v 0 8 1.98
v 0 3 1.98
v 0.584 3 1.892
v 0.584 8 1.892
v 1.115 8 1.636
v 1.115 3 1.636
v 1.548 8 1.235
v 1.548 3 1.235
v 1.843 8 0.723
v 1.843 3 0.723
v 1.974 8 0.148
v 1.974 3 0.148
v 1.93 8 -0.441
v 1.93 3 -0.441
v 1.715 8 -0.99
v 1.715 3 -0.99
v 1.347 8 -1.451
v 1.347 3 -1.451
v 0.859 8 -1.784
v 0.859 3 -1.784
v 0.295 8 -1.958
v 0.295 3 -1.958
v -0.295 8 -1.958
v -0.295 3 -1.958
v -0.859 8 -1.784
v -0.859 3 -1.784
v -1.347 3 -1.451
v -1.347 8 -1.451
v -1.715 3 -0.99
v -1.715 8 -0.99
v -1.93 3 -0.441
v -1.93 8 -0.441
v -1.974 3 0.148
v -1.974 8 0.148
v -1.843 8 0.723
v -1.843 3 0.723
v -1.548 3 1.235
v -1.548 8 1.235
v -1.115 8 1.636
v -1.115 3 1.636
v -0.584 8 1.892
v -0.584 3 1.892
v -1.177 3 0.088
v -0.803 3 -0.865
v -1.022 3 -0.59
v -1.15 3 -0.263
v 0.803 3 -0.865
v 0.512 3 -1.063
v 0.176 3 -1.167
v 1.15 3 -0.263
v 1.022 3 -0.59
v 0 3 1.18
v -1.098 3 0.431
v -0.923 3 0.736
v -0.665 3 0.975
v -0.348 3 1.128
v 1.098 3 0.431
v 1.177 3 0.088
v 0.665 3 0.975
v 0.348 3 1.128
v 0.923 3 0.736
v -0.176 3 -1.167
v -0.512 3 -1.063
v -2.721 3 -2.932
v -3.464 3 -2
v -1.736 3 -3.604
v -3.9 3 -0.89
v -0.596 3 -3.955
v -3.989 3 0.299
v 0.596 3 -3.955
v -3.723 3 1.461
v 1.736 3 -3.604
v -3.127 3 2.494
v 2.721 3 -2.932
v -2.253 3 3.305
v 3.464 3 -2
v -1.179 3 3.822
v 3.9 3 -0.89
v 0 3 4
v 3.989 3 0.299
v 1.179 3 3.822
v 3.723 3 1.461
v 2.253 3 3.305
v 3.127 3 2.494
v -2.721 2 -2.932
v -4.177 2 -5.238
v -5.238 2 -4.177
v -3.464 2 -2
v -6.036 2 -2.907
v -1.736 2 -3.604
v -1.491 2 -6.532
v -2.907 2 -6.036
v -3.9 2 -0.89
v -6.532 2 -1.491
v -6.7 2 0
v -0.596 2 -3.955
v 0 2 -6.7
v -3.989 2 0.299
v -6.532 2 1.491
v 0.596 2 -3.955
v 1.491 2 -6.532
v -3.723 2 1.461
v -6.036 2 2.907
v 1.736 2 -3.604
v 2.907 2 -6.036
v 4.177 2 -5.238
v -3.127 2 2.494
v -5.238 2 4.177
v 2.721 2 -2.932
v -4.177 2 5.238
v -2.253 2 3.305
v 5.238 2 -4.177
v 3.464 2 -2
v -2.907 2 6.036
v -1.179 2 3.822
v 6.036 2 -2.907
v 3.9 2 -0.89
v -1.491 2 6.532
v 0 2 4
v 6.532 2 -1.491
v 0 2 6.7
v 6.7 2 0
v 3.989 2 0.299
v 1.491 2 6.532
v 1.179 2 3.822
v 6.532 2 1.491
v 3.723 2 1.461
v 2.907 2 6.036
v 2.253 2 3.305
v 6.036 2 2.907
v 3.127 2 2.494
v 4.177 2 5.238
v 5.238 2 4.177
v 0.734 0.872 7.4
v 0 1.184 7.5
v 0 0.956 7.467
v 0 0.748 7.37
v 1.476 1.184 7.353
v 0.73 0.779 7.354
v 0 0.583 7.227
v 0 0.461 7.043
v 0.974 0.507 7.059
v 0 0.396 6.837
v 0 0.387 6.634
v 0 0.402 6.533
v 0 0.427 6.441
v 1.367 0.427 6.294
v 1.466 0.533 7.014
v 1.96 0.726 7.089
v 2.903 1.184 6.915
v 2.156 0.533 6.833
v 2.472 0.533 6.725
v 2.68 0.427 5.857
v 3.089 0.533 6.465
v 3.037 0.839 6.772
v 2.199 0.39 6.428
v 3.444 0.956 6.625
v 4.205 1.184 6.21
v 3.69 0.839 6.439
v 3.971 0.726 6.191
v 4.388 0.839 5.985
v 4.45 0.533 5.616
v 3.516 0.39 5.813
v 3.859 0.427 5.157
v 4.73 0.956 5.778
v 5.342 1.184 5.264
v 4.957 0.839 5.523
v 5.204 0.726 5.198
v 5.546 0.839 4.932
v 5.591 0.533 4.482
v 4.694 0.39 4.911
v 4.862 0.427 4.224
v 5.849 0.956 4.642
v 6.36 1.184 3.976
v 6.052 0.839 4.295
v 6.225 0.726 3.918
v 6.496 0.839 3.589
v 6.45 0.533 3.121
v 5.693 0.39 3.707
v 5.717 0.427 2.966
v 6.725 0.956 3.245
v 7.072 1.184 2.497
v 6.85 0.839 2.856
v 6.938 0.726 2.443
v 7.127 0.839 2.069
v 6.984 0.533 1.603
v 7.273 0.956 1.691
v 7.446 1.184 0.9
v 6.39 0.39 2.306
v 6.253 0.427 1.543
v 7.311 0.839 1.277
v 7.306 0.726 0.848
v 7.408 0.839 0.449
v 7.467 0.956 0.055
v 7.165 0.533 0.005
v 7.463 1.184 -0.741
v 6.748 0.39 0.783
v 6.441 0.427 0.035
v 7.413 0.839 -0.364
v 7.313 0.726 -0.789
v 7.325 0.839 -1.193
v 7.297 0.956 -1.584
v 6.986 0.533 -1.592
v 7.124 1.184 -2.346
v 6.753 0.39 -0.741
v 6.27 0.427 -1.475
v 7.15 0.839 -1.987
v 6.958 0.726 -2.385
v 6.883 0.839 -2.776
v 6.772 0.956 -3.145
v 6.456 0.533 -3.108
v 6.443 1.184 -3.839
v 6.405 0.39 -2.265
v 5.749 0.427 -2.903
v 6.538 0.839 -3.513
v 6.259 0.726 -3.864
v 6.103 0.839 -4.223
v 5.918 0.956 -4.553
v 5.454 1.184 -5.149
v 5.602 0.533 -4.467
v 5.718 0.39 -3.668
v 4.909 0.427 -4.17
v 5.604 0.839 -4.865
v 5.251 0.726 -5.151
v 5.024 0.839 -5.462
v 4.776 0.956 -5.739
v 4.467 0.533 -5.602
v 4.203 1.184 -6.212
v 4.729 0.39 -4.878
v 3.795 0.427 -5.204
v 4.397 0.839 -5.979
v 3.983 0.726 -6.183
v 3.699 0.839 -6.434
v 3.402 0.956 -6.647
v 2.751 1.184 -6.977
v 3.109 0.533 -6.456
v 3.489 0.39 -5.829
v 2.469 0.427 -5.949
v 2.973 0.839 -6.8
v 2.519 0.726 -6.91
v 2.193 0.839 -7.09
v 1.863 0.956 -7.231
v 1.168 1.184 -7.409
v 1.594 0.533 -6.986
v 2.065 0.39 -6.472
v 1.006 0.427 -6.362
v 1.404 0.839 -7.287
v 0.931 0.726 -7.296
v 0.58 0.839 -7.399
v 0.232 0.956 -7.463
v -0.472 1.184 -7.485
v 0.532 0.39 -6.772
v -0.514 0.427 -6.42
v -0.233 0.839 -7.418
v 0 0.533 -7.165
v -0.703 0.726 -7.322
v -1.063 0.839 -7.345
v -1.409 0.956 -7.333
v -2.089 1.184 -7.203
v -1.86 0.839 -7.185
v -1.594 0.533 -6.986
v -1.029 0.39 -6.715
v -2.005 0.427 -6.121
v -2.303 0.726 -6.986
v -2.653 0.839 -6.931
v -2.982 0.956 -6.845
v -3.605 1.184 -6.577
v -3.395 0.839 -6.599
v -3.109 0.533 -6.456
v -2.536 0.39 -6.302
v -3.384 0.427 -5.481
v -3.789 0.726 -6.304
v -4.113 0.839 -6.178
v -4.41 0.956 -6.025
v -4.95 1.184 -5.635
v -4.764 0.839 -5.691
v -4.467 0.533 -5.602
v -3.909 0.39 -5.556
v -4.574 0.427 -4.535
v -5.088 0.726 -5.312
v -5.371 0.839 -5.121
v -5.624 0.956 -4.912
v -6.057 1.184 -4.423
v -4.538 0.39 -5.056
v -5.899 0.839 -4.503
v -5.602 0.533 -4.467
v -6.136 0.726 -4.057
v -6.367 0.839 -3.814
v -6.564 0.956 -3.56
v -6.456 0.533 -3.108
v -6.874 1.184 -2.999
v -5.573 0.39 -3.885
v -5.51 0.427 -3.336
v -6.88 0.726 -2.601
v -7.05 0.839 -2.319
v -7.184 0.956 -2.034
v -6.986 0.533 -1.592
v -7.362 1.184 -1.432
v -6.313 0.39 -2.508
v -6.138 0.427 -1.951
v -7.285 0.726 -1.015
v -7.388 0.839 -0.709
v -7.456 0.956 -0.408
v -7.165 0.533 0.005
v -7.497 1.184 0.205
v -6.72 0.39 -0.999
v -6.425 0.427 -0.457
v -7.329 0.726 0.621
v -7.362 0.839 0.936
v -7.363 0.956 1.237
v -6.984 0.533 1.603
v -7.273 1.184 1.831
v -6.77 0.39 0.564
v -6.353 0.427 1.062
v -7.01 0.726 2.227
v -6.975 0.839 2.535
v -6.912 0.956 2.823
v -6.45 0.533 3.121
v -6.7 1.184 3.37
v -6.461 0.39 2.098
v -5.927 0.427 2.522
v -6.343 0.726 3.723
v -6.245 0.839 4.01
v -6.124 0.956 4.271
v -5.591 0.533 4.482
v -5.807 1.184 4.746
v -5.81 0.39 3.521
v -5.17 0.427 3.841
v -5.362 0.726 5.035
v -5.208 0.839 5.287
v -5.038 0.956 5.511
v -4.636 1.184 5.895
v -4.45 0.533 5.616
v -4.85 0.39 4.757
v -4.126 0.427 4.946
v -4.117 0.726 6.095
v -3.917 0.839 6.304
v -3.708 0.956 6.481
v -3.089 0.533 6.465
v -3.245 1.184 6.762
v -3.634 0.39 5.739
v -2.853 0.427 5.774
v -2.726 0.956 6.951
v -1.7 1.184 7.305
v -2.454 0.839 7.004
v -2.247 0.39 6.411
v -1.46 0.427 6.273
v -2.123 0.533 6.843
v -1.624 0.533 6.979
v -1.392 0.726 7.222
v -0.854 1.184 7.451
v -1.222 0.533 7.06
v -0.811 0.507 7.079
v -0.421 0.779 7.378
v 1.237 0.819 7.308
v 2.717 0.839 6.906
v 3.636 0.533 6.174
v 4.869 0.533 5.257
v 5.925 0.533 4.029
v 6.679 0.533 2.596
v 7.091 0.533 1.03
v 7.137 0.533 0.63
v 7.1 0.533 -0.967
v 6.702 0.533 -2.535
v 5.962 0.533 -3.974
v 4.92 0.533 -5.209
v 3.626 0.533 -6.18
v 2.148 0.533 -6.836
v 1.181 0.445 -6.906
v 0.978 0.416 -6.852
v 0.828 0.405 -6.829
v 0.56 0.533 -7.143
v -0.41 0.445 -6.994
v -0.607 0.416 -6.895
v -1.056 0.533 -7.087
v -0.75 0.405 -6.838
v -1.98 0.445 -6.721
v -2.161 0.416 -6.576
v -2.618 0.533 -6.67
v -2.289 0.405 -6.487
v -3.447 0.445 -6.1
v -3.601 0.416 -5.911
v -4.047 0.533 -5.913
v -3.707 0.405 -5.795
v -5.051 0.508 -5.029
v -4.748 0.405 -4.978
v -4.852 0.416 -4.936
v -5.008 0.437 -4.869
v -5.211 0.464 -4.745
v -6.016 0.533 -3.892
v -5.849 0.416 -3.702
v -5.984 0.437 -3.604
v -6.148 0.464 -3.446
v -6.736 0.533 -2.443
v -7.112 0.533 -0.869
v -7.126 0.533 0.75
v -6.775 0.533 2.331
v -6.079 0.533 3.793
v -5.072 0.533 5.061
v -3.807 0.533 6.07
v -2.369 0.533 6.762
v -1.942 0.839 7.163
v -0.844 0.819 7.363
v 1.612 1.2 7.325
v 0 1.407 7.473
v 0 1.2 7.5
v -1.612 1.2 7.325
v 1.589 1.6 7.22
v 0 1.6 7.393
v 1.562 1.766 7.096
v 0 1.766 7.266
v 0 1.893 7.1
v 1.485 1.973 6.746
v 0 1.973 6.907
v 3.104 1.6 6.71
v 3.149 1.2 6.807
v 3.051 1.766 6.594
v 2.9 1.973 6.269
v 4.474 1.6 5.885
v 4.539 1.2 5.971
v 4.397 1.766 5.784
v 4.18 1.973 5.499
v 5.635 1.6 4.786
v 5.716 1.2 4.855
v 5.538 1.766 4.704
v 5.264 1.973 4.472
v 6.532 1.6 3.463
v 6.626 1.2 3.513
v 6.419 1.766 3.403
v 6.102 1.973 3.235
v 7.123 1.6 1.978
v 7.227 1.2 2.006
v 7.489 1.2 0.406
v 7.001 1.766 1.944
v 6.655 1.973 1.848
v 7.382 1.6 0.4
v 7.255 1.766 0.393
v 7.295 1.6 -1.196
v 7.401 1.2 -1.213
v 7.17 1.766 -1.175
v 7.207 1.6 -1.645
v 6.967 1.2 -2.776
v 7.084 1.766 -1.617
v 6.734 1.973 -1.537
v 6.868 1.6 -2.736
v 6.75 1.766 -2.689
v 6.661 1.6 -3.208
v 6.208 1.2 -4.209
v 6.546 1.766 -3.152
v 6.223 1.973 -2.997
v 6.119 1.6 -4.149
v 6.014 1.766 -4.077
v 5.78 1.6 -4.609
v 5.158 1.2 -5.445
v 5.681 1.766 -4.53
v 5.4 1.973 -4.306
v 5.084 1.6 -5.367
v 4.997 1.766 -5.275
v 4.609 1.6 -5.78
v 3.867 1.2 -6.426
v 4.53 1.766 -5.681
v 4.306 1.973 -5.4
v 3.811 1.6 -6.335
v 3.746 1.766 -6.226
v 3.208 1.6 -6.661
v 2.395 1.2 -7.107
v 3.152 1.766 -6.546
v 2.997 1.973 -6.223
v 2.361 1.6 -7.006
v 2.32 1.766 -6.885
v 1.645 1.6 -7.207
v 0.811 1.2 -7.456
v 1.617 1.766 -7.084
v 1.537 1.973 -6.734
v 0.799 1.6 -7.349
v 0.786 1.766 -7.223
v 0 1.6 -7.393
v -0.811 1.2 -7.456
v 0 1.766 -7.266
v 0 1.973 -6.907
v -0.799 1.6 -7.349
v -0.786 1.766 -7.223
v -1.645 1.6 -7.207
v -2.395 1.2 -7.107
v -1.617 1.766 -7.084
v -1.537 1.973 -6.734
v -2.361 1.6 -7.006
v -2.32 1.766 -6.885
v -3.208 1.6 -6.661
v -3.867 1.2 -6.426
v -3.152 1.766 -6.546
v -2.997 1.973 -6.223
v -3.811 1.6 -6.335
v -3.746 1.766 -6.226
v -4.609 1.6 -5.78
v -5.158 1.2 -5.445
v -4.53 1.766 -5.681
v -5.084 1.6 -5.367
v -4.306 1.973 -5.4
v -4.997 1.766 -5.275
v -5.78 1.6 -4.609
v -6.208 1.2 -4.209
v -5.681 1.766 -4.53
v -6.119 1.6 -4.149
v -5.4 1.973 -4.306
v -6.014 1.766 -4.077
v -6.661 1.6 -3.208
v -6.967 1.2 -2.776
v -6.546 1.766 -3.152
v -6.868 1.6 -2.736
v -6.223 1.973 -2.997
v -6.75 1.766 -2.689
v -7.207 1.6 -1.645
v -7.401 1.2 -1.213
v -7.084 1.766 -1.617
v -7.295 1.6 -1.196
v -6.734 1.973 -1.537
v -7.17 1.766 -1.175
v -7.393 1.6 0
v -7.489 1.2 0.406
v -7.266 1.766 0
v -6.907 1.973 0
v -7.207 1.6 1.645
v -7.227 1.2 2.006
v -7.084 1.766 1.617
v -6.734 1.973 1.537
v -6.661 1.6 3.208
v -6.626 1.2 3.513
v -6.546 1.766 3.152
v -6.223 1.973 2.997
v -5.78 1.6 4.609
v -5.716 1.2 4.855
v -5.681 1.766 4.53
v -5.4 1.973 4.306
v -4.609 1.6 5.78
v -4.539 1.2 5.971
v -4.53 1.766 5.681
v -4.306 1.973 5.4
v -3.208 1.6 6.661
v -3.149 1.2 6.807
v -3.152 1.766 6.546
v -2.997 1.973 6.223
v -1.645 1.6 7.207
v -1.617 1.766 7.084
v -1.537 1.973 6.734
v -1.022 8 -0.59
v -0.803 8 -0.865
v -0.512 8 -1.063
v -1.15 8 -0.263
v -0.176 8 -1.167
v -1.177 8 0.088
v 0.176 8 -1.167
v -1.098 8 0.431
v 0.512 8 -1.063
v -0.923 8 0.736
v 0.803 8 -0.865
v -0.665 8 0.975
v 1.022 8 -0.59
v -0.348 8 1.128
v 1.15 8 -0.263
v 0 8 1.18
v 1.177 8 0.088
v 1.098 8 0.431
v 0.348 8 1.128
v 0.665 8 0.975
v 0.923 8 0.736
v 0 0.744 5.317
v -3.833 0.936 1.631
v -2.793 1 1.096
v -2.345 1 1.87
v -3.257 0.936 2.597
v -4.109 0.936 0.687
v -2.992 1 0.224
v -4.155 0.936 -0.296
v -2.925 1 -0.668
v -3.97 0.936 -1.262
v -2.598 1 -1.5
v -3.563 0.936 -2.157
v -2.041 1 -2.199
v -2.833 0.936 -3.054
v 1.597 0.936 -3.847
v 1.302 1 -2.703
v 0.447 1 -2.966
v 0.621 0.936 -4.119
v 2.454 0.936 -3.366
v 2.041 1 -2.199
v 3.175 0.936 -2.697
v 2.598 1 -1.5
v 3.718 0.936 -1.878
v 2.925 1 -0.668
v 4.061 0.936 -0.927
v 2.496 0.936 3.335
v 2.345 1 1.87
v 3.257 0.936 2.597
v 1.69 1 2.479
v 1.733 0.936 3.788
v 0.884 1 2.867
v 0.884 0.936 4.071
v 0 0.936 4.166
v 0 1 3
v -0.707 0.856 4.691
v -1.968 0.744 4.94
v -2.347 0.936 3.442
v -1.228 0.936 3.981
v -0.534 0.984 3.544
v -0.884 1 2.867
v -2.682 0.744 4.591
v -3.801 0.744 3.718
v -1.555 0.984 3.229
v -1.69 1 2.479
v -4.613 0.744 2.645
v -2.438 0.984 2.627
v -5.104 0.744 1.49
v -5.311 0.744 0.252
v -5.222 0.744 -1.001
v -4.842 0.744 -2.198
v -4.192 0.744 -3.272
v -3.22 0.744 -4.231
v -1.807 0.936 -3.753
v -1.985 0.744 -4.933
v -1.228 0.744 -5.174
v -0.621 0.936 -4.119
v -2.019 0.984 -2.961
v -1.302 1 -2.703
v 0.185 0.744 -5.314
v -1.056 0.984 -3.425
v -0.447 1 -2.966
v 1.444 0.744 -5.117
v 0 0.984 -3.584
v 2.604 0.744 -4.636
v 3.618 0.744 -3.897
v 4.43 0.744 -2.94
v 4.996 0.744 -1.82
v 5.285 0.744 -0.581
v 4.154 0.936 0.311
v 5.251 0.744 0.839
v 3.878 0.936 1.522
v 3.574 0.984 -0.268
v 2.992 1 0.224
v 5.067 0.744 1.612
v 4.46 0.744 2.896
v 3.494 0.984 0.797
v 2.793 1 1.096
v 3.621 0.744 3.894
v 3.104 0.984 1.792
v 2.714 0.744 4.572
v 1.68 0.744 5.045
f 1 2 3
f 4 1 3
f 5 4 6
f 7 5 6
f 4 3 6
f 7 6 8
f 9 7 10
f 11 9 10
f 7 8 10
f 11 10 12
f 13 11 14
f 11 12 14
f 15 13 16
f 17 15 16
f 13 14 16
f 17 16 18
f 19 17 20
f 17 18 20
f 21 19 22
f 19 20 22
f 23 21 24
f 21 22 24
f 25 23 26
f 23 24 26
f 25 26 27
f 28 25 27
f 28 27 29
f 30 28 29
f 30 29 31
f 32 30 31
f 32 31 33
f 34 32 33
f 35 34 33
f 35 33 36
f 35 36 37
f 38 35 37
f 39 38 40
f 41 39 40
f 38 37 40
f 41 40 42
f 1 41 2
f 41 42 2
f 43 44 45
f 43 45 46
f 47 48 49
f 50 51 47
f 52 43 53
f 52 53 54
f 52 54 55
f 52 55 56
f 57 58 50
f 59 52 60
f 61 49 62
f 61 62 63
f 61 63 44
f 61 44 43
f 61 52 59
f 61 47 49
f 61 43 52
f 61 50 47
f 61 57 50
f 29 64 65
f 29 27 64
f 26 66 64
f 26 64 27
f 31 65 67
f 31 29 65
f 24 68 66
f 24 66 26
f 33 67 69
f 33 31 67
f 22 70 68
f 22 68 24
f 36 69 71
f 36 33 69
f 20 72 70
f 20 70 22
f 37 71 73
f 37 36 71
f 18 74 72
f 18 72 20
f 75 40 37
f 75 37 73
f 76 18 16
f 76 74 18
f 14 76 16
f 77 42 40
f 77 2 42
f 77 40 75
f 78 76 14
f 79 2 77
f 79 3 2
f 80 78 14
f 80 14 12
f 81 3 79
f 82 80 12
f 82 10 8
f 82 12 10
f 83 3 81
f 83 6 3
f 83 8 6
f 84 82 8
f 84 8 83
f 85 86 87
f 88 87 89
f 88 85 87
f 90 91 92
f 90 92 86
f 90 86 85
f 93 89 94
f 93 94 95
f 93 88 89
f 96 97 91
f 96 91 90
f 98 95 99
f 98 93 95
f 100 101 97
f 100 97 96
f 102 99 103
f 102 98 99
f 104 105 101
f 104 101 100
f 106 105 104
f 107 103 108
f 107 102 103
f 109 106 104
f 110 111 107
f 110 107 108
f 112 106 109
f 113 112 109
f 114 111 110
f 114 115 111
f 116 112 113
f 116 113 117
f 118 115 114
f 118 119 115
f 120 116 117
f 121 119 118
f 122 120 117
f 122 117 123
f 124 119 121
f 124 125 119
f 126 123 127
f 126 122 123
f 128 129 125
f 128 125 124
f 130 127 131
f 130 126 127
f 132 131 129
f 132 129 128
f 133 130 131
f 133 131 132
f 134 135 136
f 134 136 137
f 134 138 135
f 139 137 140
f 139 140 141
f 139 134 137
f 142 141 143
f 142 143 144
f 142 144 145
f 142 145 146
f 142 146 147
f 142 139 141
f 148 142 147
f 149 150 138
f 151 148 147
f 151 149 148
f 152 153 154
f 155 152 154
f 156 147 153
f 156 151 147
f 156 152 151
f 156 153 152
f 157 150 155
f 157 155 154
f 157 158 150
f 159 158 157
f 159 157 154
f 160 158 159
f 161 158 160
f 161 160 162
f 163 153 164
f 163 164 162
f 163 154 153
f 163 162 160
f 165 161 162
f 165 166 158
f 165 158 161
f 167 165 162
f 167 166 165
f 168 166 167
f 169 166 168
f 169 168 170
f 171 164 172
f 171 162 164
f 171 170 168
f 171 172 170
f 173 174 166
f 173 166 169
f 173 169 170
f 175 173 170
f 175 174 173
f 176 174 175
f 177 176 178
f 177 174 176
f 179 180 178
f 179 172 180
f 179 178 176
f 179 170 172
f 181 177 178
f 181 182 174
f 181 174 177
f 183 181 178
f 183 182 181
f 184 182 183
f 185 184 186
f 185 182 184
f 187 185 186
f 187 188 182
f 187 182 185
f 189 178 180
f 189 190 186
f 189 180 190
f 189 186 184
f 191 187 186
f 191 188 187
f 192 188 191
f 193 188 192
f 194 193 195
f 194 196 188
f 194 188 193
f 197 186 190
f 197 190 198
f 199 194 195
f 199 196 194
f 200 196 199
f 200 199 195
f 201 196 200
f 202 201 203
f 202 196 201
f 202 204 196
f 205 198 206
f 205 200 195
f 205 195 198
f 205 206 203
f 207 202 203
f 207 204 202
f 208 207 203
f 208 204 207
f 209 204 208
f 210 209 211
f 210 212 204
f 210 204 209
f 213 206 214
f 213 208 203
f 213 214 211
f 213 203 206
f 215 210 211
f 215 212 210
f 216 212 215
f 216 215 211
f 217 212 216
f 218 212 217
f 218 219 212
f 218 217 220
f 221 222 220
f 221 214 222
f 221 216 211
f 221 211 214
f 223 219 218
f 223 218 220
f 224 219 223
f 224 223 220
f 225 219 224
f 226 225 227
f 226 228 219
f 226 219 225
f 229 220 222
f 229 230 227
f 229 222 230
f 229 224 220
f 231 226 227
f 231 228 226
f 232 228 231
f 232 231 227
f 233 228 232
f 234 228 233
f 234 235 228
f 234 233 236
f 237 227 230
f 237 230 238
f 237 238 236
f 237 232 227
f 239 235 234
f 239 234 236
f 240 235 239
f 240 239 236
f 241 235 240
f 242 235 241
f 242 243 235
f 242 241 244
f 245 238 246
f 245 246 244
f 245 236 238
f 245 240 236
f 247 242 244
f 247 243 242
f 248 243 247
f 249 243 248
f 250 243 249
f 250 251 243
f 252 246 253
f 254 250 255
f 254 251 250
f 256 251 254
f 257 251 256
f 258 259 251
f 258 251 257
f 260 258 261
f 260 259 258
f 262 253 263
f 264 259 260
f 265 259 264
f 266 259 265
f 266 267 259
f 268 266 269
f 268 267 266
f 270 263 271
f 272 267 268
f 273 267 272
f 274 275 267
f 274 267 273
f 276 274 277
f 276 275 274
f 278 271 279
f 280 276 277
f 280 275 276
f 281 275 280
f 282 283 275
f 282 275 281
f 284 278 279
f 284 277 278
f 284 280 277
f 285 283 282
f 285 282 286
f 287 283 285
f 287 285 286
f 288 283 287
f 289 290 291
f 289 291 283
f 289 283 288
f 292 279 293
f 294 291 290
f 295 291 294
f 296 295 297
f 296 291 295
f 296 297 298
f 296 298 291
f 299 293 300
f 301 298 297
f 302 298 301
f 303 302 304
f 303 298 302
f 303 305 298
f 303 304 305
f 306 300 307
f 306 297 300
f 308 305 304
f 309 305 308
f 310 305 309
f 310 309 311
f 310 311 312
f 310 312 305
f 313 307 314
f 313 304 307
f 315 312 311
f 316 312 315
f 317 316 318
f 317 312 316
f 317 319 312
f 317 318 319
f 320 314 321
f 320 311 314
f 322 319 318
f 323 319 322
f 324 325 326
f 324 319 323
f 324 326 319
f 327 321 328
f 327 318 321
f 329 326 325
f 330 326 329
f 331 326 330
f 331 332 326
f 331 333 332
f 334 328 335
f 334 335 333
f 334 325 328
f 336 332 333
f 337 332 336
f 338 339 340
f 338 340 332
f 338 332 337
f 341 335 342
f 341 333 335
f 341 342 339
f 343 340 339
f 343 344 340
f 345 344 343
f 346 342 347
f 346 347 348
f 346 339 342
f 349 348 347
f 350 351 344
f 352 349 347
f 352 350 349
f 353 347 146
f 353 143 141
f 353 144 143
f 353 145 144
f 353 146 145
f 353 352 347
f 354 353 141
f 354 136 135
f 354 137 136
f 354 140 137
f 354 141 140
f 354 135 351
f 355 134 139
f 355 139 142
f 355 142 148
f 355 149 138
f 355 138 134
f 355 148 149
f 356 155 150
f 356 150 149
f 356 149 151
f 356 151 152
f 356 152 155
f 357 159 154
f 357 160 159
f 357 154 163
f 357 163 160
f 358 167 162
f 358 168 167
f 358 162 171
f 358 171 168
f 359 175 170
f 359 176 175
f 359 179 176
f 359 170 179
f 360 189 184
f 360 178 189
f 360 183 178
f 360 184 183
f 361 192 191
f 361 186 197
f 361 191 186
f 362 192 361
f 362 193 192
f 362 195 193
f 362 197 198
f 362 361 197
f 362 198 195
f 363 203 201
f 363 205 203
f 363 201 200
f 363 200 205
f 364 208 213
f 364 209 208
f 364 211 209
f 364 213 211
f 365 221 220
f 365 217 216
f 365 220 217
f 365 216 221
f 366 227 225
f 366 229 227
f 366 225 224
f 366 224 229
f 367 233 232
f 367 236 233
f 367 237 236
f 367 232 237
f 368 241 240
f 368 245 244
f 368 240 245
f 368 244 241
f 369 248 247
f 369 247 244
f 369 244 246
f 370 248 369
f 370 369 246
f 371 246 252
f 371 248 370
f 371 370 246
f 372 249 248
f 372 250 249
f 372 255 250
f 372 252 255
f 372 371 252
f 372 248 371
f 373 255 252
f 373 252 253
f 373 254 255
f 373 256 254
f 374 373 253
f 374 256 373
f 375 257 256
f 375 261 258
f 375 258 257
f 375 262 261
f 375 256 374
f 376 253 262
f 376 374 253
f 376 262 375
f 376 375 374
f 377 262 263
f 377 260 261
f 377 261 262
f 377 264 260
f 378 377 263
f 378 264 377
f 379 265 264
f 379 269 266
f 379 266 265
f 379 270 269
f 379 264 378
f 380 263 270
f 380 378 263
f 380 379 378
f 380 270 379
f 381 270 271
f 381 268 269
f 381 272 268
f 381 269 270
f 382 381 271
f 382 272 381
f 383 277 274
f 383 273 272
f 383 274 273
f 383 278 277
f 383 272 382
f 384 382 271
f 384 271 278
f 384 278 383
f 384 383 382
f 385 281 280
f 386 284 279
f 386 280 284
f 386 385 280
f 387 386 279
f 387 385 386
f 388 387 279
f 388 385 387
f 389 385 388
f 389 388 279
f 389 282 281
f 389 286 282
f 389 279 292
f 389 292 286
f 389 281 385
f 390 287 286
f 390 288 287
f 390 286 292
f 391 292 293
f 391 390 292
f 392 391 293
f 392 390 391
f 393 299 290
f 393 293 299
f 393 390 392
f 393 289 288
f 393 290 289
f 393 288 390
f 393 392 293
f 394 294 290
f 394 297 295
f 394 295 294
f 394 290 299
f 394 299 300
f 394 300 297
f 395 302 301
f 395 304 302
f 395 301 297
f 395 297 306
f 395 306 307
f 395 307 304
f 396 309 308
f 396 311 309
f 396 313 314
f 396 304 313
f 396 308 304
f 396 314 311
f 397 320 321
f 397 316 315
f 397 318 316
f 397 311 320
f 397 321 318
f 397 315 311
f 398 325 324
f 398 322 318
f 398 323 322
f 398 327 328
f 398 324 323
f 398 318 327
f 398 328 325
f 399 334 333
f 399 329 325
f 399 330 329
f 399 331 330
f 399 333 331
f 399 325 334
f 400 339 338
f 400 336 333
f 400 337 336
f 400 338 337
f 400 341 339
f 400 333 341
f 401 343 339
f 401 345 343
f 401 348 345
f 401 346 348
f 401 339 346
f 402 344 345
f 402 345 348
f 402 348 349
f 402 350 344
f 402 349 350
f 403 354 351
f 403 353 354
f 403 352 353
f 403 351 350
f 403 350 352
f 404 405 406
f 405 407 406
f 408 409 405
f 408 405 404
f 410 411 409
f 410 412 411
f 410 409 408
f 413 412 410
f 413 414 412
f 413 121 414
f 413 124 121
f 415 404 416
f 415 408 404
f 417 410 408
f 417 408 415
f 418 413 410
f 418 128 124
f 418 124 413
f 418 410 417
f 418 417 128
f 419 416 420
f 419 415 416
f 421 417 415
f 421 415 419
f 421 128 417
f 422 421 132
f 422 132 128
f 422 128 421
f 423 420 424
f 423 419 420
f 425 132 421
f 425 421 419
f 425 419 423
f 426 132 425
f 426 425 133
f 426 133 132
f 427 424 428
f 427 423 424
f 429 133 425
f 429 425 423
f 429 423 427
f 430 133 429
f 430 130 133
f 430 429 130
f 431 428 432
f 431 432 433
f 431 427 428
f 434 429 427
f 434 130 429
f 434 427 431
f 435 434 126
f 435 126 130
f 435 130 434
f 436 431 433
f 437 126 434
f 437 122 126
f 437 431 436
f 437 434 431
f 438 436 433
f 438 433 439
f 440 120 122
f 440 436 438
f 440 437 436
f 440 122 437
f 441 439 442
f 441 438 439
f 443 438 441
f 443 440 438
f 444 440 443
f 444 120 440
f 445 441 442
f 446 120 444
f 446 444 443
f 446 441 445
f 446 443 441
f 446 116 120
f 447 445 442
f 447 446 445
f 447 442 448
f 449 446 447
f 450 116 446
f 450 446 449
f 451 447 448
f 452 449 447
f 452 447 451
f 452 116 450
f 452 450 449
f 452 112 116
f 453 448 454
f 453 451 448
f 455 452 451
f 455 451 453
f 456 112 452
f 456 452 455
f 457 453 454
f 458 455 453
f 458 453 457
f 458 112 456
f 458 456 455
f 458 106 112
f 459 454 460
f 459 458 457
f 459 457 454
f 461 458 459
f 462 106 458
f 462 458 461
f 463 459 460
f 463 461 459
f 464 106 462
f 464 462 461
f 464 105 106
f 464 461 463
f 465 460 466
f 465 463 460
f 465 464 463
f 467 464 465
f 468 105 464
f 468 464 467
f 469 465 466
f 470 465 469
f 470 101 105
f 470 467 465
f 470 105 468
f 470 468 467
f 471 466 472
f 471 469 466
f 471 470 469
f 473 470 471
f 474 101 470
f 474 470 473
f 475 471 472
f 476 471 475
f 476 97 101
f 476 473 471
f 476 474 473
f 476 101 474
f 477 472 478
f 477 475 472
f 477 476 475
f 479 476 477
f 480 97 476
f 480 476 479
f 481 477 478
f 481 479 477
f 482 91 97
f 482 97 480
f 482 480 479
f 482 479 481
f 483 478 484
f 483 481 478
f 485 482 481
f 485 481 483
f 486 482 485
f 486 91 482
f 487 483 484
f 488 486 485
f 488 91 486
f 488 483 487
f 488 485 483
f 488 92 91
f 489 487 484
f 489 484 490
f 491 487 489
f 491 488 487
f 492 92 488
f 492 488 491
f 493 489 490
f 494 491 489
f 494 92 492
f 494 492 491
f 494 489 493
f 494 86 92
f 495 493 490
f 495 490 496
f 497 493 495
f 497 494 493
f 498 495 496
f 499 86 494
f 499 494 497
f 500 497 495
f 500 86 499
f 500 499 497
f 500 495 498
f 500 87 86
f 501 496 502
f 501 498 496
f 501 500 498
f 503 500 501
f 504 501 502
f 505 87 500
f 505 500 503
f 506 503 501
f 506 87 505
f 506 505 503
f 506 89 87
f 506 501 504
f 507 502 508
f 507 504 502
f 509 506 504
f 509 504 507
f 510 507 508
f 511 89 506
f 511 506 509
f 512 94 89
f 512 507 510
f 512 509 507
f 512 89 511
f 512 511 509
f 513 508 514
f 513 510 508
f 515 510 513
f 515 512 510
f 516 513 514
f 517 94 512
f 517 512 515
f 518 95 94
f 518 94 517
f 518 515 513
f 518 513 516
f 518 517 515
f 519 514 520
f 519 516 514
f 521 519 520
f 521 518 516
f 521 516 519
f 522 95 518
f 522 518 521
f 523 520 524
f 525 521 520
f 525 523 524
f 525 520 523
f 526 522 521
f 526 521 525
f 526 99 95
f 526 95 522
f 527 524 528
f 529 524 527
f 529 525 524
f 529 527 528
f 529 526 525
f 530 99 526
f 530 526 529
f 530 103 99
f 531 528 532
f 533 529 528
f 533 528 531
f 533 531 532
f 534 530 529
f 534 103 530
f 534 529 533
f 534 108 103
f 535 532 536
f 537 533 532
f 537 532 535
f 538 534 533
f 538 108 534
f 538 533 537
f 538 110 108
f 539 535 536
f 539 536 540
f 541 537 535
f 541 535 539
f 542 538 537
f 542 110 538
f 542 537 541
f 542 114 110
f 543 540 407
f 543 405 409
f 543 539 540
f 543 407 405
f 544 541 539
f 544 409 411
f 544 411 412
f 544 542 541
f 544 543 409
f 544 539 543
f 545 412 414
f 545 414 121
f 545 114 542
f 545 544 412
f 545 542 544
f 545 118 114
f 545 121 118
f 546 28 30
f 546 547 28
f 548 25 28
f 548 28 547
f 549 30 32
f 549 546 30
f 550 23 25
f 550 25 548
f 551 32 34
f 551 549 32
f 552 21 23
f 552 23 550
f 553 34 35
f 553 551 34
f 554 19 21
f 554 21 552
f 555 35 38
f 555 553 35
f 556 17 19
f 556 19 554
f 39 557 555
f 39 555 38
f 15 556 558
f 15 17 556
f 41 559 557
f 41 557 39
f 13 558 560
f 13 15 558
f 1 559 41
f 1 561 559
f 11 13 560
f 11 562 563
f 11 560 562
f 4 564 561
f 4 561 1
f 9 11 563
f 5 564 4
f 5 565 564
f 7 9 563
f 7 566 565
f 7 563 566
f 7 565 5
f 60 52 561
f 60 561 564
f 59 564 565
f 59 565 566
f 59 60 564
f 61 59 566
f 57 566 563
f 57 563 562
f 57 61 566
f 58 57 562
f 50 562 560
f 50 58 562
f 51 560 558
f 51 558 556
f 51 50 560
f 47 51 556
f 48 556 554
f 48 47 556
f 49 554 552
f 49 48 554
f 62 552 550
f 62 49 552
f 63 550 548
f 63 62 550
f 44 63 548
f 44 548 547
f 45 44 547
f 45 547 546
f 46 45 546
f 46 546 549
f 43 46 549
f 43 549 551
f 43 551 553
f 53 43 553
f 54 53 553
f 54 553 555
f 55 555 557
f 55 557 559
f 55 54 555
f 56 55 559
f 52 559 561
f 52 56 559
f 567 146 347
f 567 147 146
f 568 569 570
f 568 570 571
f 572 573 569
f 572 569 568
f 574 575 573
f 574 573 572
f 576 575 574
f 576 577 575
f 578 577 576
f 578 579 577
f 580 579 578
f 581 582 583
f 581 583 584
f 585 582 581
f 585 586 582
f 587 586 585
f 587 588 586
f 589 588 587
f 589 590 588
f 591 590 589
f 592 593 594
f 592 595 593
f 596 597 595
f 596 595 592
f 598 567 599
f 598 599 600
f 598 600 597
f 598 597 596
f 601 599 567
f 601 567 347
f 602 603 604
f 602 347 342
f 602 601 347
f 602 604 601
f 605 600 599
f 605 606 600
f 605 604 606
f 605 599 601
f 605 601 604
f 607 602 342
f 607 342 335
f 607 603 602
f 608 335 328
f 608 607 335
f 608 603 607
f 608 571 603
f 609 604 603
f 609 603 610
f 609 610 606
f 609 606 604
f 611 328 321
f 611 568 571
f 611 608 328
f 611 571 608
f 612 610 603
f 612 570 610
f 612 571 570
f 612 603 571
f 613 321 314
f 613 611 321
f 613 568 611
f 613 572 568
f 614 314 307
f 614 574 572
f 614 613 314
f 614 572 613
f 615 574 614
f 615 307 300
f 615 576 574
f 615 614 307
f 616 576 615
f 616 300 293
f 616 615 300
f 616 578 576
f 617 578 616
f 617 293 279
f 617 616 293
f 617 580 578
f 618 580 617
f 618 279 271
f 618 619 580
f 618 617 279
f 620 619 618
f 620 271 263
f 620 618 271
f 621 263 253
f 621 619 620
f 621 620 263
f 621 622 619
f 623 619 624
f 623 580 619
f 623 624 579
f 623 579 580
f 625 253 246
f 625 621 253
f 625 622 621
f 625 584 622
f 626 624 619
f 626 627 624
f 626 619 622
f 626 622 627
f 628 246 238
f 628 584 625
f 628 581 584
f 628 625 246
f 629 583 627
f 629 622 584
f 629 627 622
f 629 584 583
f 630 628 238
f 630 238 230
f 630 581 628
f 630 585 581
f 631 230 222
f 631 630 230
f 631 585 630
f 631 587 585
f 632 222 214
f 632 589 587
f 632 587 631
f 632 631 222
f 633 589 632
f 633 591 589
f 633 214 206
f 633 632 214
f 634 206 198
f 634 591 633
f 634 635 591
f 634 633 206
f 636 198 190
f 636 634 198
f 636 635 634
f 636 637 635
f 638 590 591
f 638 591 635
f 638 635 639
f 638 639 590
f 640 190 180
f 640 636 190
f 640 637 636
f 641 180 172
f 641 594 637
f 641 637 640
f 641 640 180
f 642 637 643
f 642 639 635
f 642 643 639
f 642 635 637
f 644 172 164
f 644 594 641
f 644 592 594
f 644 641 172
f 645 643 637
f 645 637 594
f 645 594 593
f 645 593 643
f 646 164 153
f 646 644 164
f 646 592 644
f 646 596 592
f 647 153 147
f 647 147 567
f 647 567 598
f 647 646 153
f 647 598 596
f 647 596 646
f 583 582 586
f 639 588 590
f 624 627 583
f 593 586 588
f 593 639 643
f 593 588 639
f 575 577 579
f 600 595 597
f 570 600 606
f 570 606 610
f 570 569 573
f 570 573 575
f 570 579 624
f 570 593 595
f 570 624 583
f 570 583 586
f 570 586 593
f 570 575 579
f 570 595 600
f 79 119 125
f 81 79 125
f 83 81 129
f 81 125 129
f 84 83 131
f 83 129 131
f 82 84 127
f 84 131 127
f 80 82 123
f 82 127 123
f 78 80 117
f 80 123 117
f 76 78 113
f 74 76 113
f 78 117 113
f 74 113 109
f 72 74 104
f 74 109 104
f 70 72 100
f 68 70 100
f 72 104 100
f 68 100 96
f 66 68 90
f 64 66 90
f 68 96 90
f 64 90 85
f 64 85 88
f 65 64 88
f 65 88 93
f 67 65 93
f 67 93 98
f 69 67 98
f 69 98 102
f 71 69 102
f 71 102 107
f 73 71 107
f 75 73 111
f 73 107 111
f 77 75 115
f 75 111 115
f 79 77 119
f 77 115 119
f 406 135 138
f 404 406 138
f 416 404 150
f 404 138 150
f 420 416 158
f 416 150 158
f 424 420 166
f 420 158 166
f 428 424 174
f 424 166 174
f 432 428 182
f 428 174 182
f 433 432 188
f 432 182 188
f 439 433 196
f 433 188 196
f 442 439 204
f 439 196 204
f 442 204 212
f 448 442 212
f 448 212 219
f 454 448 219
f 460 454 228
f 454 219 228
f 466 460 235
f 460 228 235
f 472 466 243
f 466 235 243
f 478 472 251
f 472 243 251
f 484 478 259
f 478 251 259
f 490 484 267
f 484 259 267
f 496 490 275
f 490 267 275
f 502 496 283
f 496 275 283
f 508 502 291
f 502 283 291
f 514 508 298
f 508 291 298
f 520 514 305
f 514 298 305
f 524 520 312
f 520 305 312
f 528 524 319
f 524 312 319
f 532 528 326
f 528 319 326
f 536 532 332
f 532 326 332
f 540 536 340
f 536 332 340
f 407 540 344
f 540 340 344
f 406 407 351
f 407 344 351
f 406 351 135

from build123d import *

# Parameters (mm, degrees)
CROQUIS1_R              = 7.5
SALIENTE_EXTRUIR1_DEPTH = 2
CROQUIS2_R              = 4
SALIENTE_EXTRUIR2_DEPTH = 1
CROQUIS3_R              = 1.98
CROQUIS3_R_2            = 1.18
HEMBRA_DEPTH            = 5
REDONDEO1_R             = 0.8


with BuildPart() as part:
    # Croquis1 → Saliente-Extruir1 (new body)
    with BuildSketch(Plane(origin=(0, 0, 0), x_dir=(1, 0, 0), z_dir=(0, 1, 0))):
        with Locations(Location((0, 0, 0), (0, 0, 270))):
            Circle(CROQUIS1_R)
    extrude(amount=SALIENTE_EXTRUIR1_DEPTH)

    # Croquis2 → Saliente-Extruir2 (add)
    with BuildSketch(Plane(origin=(0, 2, 0), x_dir=(1, 0, 0), z_dir=(0, 1, 0))):
        with Locations(Location((0, 0, 0), (0, 0, 270))):
            Circle(CROQUIS2_R)
    extrude(amount=SALIENTE_EXTRUIR2_DEPTH)

    # Croquis3 → Hembra (add)
    with BuildSketch(Plane(origin=(0, 3, 0), x_dir=(1, 0, 0), z_dir=(0, 1, 0))):
        with Locations(Location((0, 0, 0), (0, 0, 270))):
            Circle(CROQUIS3_R)
        with Locations(Location((0, 0, 0), (0, 0, 270))):
            Circle(CROQUIS3_R_2, mode=Mode.SUBTRACT)
    extrude(amount=HEMBRA_DEPTH)

    # Croquis4 → Cortar-Revolución1 (revolve, cut)
    with BuildSketch(Plane.XY, mode=Mode.PRIVATE) as cortar_revoluci_n1_sk:
        with BuildLine():
            Line((0, 1), (0, 0))
            Line((0, 0), (7.5, 0))
            ThreePointArc((7.5, 0), (5.304886114, 0.746987514), (3, 1))
            Line((3, 1), (0, 1))
        make_face()
    revolve(cortar_revoluci_n1_sk.sketch.rotate(Axis((0, 6.93, 0), (0, -1, 0)), 90), axis=Axis((0, 6.93, 0), (0, -1, 0)), mode=Mode.SUBTRACT)

    # Redondeo1
    redondeo1_edges = [part.edges().sort_by_distance(p)[0] for p in [
        (0, 0, -7.5),
        (0, 2, -7.5),
    ]]
    fillet(redondeo1_edges, radius=REDONDEO1_R)


solid = part.part
